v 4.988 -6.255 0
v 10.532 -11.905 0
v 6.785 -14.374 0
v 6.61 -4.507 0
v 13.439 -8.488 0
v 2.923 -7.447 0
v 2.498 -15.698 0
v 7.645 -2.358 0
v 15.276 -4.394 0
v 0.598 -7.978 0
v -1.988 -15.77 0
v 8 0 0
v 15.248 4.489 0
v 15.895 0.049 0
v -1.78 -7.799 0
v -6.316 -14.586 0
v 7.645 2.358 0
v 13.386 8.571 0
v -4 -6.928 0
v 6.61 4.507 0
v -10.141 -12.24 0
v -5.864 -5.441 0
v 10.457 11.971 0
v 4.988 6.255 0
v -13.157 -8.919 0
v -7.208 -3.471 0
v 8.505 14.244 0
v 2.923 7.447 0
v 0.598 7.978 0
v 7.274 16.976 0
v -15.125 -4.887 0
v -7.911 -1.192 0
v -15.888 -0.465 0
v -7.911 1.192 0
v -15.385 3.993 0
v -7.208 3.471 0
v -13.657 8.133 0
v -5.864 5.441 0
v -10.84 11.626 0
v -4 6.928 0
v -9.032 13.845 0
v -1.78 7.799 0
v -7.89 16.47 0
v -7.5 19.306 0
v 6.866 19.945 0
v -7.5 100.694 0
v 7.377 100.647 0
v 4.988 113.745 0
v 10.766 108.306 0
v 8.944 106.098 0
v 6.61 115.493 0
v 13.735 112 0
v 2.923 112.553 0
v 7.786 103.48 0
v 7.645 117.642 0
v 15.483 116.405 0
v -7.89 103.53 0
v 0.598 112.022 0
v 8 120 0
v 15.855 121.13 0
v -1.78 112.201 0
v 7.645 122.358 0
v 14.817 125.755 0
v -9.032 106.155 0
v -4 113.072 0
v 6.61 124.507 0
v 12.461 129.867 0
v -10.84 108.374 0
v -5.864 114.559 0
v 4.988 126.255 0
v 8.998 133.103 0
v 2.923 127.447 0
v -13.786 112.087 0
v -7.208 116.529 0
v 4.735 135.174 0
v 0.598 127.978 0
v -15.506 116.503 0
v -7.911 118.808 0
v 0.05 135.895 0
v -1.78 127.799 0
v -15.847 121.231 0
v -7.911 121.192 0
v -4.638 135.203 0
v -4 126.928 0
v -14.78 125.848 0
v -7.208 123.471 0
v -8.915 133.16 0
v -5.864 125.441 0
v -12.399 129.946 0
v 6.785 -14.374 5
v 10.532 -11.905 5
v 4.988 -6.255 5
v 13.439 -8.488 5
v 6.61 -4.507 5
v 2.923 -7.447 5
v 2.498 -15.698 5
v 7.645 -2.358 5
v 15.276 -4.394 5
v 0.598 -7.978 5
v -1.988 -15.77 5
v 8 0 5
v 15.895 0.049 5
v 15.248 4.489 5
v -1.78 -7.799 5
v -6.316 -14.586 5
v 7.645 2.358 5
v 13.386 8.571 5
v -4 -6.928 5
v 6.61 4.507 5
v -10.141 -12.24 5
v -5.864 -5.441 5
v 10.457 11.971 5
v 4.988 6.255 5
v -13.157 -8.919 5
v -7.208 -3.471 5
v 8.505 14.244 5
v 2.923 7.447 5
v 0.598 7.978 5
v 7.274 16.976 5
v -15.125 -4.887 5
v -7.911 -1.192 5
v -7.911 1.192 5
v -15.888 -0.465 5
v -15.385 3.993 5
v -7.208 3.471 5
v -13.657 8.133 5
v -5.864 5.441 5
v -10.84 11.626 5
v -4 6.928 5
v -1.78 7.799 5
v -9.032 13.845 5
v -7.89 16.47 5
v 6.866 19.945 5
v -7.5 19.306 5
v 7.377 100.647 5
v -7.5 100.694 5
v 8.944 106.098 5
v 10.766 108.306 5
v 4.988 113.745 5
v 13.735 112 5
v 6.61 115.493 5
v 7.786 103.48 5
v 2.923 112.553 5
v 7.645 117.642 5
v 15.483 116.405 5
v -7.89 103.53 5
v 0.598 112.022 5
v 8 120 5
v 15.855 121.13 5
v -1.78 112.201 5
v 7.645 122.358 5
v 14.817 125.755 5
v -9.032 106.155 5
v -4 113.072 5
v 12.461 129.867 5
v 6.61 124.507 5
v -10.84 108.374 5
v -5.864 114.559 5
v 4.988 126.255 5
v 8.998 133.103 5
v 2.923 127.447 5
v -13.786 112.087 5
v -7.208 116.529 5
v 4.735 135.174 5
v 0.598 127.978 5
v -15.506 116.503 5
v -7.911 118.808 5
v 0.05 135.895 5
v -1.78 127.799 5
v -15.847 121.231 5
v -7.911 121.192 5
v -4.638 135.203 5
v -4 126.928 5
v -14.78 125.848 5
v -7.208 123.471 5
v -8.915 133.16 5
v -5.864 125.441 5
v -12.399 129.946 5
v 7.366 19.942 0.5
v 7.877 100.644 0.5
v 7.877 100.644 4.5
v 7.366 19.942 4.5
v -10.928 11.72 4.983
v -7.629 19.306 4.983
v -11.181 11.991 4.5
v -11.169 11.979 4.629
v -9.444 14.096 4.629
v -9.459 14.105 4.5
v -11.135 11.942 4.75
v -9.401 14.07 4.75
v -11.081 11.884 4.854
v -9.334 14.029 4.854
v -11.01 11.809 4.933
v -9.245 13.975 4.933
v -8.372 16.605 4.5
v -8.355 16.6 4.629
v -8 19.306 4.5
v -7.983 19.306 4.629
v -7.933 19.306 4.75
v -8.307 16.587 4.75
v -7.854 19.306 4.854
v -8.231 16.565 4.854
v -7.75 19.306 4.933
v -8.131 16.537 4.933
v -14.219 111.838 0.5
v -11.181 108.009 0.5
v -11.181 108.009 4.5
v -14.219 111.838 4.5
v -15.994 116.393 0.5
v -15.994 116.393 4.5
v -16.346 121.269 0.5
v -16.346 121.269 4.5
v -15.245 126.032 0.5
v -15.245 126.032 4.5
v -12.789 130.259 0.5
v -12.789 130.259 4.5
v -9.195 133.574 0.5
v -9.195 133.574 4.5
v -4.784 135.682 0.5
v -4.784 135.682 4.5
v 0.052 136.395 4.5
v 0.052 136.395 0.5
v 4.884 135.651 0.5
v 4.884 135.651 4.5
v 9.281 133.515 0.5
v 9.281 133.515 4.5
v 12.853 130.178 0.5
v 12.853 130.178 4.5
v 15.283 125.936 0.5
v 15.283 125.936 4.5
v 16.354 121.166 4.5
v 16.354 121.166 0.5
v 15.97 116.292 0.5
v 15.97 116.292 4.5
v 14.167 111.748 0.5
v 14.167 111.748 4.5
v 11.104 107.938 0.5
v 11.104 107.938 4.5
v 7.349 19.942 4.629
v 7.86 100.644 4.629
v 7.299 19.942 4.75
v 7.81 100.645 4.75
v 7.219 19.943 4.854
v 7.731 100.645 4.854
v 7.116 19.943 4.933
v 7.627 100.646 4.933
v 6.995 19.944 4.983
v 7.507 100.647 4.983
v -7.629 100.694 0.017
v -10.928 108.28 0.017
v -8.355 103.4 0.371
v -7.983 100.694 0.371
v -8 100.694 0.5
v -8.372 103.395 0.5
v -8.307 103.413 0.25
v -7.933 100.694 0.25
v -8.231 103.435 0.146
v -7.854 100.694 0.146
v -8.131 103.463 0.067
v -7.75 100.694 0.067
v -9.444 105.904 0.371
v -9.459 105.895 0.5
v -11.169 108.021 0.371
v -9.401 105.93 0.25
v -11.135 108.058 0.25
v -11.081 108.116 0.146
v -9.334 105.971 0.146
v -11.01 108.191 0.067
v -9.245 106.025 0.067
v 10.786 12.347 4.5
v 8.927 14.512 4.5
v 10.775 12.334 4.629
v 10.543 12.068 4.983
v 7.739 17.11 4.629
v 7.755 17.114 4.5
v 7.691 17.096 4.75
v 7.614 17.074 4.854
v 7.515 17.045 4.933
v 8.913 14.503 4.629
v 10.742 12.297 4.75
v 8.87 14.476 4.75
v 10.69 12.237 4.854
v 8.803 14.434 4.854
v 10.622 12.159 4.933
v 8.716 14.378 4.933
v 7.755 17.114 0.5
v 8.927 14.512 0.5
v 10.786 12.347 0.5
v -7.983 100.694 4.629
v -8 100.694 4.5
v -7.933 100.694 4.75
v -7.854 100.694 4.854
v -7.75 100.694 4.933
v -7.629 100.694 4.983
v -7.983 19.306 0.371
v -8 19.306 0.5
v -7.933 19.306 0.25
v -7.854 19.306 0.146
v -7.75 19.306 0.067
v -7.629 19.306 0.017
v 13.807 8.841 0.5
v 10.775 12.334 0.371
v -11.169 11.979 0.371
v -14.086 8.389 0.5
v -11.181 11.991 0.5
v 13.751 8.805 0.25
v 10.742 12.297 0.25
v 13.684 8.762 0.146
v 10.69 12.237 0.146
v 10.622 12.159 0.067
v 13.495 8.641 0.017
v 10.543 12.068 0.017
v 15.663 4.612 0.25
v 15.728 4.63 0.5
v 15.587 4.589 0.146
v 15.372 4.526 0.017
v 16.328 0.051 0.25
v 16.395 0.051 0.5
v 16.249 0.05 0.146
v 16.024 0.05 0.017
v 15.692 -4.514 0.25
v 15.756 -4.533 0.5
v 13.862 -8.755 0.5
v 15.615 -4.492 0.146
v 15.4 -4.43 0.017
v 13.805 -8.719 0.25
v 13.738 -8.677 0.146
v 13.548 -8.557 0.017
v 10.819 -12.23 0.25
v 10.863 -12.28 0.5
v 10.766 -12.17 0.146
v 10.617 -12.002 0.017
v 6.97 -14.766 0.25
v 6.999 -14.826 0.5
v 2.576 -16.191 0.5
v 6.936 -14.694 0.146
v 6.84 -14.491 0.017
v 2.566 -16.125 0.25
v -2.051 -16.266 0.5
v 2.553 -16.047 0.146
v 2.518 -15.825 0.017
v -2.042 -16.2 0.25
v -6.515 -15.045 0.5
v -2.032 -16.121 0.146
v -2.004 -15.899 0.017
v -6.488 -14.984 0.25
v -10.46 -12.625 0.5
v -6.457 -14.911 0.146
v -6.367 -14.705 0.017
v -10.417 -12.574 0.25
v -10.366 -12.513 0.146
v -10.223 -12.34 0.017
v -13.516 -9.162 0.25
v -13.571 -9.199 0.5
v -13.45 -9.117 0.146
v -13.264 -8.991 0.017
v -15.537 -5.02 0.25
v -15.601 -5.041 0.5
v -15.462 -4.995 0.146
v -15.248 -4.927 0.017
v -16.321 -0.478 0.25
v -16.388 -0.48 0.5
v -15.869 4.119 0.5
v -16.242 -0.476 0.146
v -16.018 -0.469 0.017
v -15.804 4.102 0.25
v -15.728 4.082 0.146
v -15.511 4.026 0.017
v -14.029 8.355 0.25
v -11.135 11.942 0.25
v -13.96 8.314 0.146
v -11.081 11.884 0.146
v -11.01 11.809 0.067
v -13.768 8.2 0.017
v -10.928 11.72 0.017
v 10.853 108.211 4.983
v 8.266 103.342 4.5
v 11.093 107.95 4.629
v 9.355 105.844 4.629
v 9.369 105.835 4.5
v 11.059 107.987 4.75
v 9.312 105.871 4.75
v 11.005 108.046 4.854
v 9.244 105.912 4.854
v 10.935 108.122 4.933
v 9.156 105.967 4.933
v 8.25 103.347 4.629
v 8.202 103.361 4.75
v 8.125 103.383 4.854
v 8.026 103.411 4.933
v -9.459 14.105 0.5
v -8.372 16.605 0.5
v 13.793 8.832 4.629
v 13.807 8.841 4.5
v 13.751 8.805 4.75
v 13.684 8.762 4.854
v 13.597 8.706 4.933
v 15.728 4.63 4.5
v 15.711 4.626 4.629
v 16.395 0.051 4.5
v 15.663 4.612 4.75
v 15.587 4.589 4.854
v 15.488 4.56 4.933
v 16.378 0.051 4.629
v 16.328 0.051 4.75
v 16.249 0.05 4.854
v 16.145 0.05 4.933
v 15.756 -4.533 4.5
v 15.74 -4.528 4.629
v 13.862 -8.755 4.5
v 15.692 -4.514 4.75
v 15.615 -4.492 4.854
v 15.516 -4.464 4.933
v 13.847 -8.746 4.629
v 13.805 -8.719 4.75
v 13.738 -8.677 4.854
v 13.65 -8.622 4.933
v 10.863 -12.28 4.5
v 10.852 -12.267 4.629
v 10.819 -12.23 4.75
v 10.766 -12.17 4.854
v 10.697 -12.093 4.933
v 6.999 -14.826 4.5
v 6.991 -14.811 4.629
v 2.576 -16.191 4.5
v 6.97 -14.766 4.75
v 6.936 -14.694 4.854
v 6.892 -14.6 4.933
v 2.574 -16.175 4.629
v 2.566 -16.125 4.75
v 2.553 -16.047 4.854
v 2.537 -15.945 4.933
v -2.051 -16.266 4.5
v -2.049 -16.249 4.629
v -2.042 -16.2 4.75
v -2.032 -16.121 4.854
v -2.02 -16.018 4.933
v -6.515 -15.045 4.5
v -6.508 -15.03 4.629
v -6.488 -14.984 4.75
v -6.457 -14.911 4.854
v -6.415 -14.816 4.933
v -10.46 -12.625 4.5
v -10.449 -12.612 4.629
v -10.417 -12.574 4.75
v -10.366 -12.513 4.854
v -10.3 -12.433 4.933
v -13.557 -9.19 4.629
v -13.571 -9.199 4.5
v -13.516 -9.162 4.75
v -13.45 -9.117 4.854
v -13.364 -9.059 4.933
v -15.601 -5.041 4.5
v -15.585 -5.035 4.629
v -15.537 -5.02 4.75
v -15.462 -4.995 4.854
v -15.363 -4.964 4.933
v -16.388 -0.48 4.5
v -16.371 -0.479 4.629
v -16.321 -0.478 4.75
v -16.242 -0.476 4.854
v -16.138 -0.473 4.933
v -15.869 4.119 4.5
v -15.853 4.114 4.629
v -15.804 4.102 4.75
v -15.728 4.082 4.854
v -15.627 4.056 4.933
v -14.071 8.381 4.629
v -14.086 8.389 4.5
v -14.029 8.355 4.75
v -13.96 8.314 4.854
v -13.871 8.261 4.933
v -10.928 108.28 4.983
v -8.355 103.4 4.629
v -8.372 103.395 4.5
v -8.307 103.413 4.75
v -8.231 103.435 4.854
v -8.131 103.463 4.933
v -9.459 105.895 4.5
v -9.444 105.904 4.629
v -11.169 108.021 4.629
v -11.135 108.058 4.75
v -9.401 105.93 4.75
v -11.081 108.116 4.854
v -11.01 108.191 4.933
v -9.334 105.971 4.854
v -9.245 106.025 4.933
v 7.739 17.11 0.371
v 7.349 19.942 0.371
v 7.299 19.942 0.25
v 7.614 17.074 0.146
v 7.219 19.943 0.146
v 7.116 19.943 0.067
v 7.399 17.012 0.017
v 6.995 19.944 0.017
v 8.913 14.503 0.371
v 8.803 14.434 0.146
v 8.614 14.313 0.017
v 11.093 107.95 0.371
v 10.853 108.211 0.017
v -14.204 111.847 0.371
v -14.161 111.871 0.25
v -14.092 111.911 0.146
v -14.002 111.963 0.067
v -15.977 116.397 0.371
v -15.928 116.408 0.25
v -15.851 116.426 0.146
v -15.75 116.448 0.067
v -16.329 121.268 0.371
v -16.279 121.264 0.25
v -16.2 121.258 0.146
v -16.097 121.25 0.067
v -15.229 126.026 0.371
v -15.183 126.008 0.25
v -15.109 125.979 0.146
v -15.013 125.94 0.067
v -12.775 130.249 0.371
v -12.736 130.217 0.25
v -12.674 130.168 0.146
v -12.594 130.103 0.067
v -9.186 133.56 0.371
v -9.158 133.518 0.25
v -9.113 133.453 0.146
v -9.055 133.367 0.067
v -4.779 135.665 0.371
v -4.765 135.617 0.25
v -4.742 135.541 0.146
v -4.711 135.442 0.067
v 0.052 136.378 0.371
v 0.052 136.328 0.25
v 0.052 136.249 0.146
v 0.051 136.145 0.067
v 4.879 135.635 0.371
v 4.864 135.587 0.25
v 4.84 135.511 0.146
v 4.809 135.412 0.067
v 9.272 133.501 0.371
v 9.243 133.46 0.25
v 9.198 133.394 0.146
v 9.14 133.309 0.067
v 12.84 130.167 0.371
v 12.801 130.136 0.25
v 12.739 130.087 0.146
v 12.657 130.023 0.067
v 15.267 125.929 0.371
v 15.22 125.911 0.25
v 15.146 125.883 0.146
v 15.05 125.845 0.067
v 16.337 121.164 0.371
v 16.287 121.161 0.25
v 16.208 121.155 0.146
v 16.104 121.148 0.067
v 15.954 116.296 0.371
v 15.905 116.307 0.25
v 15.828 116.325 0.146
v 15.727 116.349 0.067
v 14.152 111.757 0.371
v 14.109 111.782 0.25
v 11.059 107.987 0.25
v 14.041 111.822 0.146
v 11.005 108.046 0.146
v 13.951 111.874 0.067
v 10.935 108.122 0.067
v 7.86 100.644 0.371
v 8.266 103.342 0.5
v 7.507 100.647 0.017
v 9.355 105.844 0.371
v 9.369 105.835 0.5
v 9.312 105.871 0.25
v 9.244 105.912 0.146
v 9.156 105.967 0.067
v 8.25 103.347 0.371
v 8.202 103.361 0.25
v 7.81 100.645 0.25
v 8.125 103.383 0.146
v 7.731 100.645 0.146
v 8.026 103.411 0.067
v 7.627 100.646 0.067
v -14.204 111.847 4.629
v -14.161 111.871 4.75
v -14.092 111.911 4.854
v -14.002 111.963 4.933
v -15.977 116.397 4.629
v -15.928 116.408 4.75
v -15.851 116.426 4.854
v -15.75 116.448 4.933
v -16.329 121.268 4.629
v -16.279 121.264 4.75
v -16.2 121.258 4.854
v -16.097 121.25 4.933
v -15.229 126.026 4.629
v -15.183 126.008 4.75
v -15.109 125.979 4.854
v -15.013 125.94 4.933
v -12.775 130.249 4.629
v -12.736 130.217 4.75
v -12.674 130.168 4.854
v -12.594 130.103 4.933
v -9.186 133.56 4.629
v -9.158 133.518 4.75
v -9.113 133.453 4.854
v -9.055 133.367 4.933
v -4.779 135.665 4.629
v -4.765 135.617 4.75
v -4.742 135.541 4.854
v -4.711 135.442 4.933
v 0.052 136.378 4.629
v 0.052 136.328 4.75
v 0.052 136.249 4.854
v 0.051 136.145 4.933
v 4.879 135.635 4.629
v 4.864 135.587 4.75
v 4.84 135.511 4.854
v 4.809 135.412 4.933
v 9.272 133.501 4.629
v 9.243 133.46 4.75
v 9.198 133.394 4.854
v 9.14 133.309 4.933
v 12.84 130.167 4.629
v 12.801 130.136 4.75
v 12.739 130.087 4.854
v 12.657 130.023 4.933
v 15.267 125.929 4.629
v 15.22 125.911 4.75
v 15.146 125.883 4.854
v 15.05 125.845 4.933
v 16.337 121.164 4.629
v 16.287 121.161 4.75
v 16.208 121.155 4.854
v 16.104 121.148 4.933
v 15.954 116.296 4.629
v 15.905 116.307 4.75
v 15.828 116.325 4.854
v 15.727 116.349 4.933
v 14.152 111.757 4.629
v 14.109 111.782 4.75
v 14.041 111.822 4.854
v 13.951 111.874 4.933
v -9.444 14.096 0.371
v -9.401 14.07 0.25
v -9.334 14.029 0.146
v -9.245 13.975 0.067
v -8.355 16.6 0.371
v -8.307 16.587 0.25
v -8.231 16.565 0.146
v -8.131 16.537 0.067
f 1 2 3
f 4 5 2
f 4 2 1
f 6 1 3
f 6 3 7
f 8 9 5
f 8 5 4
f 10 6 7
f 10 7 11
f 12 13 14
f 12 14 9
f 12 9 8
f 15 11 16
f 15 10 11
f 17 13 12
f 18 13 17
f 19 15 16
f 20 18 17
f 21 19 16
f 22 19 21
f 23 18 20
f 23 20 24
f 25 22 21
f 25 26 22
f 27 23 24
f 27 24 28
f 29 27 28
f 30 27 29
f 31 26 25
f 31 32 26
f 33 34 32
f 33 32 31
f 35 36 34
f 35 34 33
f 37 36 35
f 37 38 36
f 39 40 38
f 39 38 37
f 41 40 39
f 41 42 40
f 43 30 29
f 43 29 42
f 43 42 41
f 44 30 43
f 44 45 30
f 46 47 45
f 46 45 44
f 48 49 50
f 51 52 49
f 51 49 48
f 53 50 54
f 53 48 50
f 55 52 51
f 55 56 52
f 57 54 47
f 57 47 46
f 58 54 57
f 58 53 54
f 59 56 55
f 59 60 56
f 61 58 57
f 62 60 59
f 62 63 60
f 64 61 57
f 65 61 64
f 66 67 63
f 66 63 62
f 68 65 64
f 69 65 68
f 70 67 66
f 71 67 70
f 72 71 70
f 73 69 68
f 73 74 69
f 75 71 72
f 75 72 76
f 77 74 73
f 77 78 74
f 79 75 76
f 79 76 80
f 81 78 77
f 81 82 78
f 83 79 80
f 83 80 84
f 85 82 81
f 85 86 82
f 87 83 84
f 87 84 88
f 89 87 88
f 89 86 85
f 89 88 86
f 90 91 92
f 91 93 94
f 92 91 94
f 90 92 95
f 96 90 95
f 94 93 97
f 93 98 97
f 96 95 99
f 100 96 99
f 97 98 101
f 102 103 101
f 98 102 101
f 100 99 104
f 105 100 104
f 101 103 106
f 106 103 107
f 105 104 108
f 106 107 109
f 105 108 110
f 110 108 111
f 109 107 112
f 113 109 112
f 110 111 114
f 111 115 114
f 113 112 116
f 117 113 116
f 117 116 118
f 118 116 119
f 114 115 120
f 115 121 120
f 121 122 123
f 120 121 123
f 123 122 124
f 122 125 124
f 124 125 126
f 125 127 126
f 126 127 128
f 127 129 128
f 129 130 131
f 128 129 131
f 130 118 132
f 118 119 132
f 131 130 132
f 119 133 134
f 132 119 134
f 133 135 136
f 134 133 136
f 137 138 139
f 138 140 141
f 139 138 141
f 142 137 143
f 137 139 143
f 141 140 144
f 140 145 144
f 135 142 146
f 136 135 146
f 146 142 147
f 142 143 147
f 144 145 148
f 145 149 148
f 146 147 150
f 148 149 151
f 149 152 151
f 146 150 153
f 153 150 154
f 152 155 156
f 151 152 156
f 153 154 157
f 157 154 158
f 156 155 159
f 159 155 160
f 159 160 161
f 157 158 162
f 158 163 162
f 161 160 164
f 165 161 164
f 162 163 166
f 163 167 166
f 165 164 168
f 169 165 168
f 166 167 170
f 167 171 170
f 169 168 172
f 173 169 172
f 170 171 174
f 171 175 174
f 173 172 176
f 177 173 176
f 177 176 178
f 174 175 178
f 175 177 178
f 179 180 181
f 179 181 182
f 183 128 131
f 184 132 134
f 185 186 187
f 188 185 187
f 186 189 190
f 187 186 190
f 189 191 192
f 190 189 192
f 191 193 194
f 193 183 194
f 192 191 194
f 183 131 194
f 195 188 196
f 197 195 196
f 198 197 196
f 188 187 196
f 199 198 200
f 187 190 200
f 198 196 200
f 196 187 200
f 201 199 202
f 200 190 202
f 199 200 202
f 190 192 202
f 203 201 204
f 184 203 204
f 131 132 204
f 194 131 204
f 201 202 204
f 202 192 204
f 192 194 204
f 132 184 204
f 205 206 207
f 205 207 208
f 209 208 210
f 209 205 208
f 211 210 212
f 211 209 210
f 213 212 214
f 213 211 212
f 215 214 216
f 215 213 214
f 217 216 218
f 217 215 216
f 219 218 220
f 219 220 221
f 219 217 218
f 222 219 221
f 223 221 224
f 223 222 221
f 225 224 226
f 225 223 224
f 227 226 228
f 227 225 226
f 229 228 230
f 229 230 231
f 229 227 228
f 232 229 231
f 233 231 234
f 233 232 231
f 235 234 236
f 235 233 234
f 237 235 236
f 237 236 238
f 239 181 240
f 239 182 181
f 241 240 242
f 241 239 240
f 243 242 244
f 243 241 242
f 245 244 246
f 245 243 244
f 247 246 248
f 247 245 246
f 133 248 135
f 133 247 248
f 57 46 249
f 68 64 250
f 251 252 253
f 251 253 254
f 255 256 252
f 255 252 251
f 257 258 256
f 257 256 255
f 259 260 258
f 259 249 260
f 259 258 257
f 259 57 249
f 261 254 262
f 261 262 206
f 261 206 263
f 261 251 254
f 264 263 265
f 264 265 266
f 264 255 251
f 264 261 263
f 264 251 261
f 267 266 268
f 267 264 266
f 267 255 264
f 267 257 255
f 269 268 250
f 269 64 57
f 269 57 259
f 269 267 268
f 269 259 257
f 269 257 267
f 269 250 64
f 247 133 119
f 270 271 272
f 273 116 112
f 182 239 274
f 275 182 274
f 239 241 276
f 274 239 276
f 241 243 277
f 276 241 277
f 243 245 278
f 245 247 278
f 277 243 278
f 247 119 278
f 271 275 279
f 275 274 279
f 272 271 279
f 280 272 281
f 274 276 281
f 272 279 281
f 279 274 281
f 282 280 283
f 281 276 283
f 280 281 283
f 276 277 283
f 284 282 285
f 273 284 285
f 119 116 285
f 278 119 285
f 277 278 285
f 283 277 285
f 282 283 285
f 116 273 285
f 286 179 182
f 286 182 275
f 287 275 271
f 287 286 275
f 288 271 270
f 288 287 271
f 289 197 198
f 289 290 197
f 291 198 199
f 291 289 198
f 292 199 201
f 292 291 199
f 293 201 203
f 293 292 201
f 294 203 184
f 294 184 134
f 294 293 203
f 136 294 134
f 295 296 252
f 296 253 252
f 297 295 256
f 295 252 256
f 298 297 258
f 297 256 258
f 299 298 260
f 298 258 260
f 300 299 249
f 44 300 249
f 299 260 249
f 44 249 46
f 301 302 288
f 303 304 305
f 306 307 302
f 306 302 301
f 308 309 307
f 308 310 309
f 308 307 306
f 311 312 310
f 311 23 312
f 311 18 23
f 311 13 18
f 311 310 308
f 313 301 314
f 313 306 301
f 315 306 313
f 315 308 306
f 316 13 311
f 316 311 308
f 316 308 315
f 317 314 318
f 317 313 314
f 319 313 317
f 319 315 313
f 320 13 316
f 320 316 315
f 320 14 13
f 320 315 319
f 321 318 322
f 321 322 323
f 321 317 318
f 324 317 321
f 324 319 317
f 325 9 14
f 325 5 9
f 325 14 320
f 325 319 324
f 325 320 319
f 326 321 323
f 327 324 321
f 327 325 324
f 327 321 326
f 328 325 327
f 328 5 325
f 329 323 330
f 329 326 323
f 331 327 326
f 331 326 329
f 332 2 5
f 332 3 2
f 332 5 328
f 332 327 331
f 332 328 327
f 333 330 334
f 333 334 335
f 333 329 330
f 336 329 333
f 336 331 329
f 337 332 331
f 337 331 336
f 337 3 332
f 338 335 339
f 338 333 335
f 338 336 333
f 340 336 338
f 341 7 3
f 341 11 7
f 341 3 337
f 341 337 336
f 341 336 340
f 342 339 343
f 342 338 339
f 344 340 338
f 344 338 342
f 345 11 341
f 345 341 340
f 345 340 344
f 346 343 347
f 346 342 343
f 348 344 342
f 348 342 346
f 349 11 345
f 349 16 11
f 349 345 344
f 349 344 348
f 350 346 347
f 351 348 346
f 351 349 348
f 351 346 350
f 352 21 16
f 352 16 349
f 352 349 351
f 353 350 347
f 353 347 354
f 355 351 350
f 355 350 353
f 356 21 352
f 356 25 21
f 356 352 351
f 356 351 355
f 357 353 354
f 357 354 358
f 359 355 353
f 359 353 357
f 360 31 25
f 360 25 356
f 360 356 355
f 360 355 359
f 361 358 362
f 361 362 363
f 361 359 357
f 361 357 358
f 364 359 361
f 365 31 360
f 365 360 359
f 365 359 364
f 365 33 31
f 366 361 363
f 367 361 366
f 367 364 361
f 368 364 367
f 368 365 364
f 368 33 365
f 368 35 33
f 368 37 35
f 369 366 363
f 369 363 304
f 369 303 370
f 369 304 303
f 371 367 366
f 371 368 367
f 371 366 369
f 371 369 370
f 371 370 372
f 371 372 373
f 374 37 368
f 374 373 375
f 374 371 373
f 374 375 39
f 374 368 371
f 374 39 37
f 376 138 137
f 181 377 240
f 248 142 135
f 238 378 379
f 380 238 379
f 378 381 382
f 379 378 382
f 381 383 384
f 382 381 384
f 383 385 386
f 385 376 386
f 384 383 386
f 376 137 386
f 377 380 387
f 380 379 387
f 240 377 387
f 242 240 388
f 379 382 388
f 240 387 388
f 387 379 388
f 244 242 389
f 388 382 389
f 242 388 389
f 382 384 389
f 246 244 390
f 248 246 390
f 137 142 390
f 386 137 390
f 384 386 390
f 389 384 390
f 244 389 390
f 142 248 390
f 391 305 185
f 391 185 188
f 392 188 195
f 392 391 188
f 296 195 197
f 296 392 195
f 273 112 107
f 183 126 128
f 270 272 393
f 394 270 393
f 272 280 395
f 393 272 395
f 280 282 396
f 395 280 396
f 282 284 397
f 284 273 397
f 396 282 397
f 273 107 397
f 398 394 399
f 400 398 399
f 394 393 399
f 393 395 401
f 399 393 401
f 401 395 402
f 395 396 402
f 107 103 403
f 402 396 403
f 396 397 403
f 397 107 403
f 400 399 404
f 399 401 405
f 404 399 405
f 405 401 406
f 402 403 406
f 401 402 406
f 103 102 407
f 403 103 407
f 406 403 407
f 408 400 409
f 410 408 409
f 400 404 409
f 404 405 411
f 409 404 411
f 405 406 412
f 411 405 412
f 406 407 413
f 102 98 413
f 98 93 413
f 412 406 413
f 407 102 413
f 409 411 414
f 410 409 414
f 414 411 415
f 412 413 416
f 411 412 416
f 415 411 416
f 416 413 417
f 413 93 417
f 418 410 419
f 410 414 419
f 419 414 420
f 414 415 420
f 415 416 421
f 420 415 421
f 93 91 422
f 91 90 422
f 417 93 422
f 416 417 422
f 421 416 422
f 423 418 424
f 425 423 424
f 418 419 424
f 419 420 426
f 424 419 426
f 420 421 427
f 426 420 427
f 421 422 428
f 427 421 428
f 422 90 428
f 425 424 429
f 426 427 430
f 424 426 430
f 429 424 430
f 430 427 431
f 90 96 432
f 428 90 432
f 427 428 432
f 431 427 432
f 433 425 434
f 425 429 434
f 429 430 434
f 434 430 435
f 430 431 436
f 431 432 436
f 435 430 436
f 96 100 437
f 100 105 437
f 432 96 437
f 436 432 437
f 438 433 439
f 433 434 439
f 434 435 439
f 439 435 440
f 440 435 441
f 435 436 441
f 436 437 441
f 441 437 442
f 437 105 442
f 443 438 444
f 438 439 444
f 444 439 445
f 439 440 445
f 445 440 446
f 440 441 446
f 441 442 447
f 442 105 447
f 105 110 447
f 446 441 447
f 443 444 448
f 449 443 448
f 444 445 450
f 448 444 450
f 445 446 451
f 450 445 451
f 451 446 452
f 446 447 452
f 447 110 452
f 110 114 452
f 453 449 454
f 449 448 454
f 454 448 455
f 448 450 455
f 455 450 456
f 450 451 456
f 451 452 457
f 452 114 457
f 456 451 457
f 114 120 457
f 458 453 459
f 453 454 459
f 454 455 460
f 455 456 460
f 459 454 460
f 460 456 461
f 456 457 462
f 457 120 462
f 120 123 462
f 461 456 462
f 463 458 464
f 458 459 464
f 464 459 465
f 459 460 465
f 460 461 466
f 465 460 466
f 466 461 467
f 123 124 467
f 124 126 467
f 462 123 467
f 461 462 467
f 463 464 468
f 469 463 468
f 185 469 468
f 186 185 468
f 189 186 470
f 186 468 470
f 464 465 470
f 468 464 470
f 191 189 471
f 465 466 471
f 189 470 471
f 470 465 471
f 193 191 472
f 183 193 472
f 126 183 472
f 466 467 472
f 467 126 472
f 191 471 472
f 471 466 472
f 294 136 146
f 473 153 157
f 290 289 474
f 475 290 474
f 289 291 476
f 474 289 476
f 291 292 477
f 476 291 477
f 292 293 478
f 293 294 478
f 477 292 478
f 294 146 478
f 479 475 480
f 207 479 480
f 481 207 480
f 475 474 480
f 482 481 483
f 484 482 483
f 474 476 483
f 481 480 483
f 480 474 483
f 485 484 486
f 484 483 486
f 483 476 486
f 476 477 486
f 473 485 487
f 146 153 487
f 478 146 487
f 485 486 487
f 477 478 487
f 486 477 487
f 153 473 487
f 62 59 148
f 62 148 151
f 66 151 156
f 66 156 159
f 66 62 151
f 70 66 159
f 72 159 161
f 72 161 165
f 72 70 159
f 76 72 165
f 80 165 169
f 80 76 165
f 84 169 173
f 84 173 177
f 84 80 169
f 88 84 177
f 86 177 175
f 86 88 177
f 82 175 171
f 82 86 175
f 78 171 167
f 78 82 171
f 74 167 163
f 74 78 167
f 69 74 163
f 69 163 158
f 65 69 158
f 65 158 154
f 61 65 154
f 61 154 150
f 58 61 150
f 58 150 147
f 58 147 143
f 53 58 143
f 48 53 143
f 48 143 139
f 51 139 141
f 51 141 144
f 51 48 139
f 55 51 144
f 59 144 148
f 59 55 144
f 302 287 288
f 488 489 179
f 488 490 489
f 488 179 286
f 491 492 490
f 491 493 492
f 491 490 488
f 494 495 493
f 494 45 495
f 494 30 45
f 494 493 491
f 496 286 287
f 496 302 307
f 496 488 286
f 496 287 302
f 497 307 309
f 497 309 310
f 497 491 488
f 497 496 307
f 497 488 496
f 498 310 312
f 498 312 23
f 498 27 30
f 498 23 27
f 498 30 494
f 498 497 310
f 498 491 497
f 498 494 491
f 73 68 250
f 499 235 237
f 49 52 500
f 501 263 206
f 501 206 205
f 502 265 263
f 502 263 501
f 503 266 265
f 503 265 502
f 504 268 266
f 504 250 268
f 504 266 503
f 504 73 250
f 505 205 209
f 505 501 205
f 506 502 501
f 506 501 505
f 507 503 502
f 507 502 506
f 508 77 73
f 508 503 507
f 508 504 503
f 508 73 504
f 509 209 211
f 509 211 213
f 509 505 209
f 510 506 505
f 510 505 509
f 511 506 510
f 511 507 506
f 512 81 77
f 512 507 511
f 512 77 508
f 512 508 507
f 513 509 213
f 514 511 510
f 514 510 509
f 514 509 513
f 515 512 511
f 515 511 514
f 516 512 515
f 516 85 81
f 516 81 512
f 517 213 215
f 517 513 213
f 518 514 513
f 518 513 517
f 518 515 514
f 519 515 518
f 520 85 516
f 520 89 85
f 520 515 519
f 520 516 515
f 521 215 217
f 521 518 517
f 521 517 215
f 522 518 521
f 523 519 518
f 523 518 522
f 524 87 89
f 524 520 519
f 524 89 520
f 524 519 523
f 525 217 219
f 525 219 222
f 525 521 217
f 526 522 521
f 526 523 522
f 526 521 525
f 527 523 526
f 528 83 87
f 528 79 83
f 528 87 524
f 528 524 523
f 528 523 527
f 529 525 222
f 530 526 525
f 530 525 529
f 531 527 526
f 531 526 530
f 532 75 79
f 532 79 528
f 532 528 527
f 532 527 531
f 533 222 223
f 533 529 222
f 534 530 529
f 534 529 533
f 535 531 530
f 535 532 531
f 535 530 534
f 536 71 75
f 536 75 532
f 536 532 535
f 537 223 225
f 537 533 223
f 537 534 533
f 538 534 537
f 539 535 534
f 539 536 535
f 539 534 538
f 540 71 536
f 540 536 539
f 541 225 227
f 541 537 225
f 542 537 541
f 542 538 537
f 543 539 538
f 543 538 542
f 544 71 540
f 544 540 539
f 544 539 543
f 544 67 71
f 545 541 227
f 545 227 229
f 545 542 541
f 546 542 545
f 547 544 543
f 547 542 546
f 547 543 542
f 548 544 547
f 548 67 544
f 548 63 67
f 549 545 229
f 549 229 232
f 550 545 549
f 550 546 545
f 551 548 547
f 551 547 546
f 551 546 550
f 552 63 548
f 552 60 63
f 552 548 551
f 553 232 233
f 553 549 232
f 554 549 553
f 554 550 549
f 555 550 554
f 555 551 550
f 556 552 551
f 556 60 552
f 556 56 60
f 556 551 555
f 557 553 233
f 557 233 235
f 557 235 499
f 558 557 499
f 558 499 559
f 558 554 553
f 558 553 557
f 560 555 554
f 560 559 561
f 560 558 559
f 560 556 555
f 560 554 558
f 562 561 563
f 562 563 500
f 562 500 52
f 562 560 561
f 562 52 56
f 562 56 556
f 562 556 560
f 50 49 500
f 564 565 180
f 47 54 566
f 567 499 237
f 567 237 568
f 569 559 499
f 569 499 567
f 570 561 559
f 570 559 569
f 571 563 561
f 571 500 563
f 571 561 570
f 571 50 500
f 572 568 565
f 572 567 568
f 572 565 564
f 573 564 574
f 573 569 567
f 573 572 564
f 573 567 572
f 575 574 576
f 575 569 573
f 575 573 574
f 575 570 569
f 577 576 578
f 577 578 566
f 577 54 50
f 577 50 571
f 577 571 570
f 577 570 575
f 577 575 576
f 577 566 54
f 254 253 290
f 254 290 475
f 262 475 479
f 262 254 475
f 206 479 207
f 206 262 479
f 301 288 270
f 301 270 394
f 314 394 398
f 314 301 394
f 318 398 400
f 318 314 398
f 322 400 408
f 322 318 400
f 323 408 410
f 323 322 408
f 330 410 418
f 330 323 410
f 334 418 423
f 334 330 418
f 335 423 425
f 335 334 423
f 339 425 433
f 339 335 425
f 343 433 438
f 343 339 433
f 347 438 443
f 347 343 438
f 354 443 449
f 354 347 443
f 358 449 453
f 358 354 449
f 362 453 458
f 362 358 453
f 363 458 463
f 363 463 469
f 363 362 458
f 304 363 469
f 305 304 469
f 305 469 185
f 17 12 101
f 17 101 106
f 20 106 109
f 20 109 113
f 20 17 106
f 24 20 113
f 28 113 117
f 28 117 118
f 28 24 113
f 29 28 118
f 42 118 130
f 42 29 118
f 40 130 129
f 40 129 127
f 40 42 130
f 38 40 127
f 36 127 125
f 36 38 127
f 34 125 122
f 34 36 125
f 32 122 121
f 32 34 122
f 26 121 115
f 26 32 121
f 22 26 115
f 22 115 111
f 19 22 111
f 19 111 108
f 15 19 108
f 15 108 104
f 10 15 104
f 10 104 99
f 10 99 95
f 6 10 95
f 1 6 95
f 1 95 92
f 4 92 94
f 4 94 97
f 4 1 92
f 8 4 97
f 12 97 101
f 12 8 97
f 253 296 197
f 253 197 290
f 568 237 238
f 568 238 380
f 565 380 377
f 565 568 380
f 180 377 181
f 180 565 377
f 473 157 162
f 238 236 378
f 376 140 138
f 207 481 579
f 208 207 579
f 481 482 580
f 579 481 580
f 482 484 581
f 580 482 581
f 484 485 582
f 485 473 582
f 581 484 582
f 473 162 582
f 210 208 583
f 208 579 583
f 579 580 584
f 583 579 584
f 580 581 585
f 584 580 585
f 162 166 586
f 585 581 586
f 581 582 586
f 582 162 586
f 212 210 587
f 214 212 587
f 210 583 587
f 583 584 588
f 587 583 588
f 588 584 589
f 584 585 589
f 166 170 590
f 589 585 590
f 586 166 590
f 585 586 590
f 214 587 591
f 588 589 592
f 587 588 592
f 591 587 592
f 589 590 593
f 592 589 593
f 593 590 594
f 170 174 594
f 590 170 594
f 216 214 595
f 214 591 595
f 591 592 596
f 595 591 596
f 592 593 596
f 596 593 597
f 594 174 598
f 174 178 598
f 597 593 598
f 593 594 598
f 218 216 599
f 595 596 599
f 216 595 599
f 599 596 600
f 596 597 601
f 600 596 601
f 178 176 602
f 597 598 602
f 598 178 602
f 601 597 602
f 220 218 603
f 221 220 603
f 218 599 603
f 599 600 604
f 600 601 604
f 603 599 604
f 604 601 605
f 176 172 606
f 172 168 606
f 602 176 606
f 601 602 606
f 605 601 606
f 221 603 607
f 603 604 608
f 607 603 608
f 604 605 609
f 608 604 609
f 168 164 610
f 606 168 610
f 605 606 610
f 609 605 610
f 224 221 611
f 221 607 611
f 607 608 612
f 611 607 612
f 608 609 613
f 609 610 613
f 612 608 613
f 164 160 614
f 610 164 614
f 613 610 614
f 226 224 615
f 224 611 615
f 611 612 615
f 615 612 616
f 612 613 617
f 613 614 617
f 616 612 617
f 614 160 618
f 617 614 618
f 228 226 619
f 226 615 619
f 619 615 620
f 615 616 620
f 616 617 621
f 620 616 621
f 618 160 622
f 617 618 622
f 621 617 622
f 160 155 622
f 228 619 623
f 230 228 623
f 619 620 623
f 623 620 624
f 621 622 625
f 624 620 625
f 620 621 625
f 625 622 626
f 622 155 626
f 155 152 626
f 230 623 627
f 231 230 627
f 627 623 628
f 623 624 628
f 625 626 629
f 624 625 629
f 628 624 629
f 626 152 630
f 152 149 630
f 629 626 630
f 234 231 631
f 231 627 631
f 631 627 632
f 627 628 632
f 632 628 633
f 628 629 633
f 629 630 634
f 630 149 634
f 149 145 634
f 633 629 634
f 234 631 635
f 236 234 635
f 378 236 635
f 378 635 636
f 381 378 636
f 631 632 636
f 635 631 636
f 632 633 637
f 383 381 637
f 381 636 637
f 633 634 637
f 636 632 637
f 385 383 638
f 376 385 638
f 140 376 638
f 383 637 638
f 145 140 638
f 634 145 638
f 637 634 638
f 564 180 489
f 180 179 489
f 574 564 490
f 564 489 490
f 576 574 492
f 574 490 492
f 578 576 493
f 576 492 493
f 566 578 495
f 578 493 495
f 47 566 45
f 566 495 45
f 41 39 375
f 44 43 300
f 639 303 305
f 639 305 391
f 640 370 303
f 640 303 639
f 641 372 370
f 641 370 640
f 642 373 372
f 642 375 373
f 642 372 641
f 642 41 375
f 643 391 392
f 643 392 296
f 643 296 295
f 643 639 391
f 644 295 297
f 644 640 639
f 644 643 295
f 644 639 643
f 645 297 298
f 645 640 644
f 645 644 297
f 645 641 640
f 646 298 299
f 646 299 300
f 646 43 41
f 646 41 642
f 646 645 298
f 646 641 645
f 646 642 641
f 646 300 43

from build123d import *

# Parameters (mm, degrees)
SKETCH_1_R      = 8
EXTRUDE_1_DEPTH = 5
FILLET_1_R      = 0.5


with BuildPart() as part:
    # 草图1 → 凸台-拉伸1 (new body)
    with BuildSketch(Plane.XY):
        with BuildLine():
            Line((-8, 19.305502441), (-8, 100.694497559))
            ThreePointArc((-8, 100.694497559), (-8.829546885, 104.682327755), (-11.180557935, 108.008539527))
            ThreePointArc((-11.180557935, 108.008539527), (0.051988176, 136.395038799), (11.104284737, 107.93787496))
            ThreePointArc((11.104284737, 107.93787496), (8.732226543, 104.626639898), (7.877406014, 100.644150781))
            Line((7.877406014, 100.644150781), (7.365590706, 19.941690023))
            ThreePointArc((7.365590706, 19.941690023), (8.247647691, 15.771352421), (10.786374698, 12.347231304))
            ThreePointArc((10.786374698, 12.347231304), (0.265496379, -16.392971411), (-11.180557935, 11.991460473))
            ThreePointArc((-11.180557935, 11.991460473), (-8.829546885, 15.317672245), (-8, 19.305502441))
        make_face()
        with Locations((0, 120)):
            Circle(SKETCH_1_R, mode=Mode.SUBTRACT)
        Circle(SKETCH_1_R, mode=Mode.SUBTRACT)
    extrude(amount=EXTRUDE_1_DEPTH)

    # 圆角1
    fillet_1_edges = [part.edges().sort_by_distance(p)[0] for p in [
        (0.265496379, -16.392971411, 0),
        (-8.829546885, 15.317672245, 0),
        (-8, 60, 0),
        (-8.829546885, 104.682327755, 0),
        (-8.829546885, 15.317672245, 5),
        (0.265496379, -16.392971411, 5),
        (8.247647691, 15.771352421, 5),
        (7.62149836, 60.292920402, 5),
        (8.732226543, 104.626639898, 5),
        (0.051988176, 136.395038799, 5),
        (-8.829546885, 104.682327755, 5),
        (0.051988176, 136.395038799, 0),
        (-8, 60, 5),
        (8.732226543, 104.626639898, 0),
        (7.62149836, 60.292920402, 0),
        (8.247647691, 15.771352421, 0),
    ]]
    fillet(fillet_1_edges, radius=FILLET_1_R)


solid = part.part
